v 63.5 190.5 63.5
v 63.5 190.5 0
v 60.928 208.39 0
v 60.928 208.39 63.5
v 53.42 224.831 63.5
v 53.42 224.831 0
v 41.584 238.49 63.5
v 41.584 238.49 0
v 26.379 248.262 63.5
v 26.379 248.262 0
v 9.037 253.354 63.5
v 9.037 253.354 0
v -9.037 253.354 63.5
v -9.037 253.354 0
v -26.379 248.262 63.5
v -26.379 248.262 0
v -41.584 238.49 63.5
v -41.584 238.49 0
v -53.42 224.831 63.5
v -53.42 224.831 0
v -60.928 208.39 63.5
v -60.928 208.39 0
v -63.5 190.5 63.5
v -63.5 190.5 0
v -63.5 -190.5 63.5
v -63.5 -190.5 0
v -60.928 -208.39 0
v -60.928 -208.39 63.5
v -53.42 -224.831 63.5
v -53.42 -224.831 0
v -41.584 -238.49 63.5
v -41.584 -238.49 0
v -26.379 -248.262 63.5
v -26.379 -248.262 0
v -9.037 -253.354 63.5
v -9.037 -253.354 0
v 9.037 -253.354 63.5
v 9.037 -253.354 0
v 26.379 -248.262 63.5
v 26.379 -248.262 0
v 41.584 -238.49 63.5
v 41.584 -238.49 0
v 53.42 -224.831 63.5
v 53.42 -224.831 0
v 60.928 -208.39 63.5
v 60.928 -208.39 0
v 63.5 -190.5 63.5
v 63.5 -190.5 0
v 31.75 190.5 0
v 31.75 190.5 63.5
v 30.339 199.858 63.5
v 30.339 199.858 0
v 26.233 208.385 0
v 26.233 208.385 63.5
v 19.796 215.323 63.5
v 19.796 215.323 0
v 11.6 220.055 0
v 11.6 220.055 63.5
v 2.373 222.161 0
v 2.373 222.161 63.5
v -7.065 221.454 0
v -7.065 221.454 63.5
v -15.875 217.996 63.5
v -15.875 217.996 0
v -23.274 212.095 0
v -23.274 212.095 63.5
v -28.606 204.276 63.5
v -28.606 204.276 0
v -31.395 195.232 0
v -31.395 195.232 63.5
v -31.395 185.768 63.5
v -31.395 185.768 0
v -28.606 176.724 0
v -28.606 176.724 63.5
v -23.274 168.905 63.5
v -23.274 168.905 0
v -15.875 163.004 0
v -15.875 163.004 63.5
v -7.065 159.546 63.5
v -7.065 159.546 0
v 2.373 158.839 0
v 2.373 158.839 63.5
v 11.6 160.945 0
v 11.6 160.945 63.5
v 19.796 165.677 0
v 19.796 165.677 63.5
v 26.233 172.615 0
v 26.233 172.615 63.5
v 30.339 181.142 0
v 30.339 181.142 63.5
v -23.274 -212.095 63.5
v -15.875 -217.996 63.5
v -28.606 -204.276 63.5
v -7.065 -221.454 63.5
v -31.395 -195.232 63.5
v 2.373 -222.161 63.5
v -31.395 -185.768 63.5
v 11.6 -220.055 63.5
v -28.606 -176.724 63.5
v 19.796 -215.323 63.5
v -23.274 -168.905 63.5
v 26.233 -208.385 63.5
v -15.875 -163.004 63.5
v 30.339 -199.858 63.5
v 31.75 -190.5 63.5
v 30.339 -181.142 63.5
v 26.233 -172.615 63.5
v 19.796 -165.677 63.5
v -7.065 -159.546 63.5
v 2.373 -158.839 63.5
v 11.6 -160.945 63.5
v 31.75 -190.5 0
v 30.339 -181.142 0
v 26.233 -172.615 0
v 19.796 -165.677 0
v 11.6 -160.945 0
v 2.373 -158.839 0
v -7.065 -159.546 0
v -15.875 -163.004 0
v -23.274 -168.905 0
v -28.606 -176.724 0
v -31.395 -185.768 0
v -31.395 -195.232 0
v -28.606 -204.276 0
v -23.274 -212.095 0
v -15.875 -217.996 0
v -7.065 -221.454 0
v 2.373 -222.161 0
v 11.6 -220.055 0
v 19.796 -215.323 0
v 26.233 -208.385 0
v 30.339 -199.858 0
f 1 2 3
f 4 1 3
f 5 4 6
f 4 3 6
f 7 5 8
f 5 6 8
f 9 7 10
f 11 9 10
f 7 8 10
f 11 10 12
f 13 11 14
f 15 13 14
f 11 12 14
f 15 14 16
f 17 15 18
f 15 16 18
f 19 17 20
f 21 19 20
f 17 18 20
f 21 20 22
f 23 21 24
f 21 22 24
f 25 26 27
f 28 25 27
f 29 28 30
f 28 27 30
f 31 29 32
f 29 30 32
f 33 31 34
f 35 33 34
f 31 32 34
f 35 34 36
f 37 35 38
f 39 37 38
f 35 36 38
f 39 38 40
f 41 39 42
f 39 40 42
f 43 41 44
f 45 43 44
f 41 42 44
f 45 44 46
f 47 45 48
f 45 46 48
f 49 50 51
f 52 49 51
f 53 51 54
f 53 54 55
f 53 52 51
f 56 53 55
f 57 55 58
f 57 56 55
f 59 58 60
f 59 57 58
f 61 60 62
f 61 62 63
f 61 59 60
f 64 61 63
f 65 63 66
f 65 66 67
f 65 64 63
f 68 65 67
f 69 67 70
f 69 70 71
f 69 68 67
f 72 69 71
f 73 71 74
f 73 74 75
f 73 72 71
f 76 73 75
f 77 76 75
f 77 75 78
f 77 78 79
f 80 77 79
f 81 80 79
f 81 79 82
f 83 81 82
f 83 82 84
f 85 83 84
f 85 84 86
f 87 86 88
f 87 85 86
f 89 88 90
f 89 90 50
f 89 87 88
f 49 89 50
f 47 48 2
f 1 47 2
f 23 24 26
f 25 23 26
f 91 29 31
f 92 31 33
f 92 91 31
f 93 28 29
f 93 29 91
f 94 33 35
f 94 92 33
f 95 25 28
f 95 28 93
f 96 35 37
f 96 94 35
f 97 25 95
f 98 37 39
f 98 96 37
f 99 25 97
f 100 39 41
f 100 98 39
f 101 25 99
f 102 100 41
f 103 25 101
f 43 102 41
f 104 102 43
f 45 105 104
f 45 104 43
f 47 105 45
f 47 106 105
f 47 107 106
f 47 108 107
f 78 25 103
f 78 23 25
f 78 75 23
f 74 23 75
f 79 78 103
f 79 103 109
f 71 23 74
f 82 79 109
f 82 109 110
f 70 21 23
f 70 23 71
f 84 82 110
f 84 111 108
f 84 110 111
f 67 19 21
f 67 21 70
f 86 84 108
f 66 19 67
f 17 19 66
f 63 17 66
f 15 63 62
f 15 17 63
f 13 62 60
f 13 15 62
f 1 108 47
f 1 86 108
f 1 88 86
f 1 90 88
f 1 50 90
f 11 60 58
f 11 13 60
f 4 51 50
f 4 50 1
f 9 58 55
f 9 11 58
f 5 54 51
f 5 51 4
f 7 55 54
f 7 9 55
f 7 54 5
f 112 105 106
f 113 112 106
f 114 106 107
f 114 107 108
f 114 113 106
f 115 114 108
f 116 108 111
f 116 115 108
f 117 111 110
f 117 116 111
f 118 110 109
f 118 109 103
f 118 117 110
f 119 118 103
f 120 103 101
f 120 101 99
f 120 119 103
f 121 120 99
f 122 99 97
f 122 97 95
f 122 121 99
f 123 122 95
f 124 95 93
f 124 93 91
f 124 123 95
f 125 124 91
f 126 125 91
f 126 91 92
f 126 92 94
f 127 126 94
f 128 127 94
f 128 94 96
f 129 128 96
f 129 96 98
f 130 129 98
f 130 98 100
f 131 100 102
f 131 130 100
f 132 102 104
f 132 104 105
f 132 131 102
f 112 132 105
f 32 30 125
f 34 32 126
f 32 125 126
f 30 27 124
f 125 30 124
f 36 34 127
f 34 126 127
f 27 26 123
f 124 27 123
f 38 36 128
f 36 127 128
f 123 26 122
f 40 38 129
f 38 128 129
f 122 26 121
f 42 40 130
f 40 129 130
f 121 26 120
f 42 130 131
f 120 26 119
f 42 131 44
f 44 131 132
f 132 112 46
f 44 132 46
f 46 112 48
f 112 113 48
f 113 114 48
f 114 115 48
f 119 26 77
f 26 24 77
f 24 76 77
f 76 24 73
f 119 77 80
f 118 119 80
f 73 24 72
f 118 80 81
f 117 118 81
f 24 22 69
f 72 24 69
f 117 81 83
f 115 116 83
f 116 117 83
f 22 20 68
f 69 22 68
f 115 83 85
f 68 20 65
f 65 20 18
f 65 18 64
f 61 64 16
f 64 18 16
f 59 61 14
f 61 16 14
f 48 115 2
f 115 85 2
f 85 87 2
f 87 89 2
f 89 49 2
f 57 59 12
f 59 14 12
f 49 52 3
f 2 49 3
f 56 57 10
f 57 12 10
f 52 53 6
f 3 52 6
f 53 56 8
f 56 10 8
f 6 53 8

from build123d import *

# Parameters (mm, degrees)
F1_DEPTH = 63.5
F2_R     = 31.75
F3_DEPTH = 63.5


with BuildPart() as f1:
    # F0 (on Top) → F1 (new body)
    with BuildSketch(Plane.XY):
        with BuildLine():
            ThreePointArc((-63.5, -190.5), (0, -254), (63.5, -190.5))
            Line((63.5, -190.5), (-63.5, -190.5))
        make_face()
        with BuildLine():
            ThreePointArc((-63.5, -190.5), (0, -127), (63.5, -190.5))
            Line((63.5, -190.5), (63.5, 190.5))
            ThreePointArc((63.5, 190.5), (0, 127), (-63.5, 190.5))
            Line((-63.5, 190.5), (-63.5, -190.5))
        make_face()
        with BuildLine():
            Line((-63.5, -190.5), (63.5, -190.5))
            ThreePointArc((63.5, -190.5), (0, -127), (-63.5, -190.5))
        make_face()
        with BuildLine():
            ThreePointArc((-63.5, 190.5), (0, 127), (63.5, 190.5))
            Line((63.5, 190.5), (-63.5, 190.5))
        make_face()
        with BuildLine():
            Line((-63.5, 190.5), (63.5, 190.5))
            ThreePointArc((63.5, 190.5), (0, 254), (-63.5, 190.5))
        make_face()
    extrude(amount=F1_DEPTH)

    # F2 (on Top) → F3 (cut, through all)
    with BuildSketch(Plane.XY):
        with Locations((0, 190.5)):
            Circle(F2_R)
        with Locations((0, -190.5)):
            Circle(F2_R)
    extrude(amount=F3_DEPTH, mode=Mode.SUBTRACT)


solid = f1.part
